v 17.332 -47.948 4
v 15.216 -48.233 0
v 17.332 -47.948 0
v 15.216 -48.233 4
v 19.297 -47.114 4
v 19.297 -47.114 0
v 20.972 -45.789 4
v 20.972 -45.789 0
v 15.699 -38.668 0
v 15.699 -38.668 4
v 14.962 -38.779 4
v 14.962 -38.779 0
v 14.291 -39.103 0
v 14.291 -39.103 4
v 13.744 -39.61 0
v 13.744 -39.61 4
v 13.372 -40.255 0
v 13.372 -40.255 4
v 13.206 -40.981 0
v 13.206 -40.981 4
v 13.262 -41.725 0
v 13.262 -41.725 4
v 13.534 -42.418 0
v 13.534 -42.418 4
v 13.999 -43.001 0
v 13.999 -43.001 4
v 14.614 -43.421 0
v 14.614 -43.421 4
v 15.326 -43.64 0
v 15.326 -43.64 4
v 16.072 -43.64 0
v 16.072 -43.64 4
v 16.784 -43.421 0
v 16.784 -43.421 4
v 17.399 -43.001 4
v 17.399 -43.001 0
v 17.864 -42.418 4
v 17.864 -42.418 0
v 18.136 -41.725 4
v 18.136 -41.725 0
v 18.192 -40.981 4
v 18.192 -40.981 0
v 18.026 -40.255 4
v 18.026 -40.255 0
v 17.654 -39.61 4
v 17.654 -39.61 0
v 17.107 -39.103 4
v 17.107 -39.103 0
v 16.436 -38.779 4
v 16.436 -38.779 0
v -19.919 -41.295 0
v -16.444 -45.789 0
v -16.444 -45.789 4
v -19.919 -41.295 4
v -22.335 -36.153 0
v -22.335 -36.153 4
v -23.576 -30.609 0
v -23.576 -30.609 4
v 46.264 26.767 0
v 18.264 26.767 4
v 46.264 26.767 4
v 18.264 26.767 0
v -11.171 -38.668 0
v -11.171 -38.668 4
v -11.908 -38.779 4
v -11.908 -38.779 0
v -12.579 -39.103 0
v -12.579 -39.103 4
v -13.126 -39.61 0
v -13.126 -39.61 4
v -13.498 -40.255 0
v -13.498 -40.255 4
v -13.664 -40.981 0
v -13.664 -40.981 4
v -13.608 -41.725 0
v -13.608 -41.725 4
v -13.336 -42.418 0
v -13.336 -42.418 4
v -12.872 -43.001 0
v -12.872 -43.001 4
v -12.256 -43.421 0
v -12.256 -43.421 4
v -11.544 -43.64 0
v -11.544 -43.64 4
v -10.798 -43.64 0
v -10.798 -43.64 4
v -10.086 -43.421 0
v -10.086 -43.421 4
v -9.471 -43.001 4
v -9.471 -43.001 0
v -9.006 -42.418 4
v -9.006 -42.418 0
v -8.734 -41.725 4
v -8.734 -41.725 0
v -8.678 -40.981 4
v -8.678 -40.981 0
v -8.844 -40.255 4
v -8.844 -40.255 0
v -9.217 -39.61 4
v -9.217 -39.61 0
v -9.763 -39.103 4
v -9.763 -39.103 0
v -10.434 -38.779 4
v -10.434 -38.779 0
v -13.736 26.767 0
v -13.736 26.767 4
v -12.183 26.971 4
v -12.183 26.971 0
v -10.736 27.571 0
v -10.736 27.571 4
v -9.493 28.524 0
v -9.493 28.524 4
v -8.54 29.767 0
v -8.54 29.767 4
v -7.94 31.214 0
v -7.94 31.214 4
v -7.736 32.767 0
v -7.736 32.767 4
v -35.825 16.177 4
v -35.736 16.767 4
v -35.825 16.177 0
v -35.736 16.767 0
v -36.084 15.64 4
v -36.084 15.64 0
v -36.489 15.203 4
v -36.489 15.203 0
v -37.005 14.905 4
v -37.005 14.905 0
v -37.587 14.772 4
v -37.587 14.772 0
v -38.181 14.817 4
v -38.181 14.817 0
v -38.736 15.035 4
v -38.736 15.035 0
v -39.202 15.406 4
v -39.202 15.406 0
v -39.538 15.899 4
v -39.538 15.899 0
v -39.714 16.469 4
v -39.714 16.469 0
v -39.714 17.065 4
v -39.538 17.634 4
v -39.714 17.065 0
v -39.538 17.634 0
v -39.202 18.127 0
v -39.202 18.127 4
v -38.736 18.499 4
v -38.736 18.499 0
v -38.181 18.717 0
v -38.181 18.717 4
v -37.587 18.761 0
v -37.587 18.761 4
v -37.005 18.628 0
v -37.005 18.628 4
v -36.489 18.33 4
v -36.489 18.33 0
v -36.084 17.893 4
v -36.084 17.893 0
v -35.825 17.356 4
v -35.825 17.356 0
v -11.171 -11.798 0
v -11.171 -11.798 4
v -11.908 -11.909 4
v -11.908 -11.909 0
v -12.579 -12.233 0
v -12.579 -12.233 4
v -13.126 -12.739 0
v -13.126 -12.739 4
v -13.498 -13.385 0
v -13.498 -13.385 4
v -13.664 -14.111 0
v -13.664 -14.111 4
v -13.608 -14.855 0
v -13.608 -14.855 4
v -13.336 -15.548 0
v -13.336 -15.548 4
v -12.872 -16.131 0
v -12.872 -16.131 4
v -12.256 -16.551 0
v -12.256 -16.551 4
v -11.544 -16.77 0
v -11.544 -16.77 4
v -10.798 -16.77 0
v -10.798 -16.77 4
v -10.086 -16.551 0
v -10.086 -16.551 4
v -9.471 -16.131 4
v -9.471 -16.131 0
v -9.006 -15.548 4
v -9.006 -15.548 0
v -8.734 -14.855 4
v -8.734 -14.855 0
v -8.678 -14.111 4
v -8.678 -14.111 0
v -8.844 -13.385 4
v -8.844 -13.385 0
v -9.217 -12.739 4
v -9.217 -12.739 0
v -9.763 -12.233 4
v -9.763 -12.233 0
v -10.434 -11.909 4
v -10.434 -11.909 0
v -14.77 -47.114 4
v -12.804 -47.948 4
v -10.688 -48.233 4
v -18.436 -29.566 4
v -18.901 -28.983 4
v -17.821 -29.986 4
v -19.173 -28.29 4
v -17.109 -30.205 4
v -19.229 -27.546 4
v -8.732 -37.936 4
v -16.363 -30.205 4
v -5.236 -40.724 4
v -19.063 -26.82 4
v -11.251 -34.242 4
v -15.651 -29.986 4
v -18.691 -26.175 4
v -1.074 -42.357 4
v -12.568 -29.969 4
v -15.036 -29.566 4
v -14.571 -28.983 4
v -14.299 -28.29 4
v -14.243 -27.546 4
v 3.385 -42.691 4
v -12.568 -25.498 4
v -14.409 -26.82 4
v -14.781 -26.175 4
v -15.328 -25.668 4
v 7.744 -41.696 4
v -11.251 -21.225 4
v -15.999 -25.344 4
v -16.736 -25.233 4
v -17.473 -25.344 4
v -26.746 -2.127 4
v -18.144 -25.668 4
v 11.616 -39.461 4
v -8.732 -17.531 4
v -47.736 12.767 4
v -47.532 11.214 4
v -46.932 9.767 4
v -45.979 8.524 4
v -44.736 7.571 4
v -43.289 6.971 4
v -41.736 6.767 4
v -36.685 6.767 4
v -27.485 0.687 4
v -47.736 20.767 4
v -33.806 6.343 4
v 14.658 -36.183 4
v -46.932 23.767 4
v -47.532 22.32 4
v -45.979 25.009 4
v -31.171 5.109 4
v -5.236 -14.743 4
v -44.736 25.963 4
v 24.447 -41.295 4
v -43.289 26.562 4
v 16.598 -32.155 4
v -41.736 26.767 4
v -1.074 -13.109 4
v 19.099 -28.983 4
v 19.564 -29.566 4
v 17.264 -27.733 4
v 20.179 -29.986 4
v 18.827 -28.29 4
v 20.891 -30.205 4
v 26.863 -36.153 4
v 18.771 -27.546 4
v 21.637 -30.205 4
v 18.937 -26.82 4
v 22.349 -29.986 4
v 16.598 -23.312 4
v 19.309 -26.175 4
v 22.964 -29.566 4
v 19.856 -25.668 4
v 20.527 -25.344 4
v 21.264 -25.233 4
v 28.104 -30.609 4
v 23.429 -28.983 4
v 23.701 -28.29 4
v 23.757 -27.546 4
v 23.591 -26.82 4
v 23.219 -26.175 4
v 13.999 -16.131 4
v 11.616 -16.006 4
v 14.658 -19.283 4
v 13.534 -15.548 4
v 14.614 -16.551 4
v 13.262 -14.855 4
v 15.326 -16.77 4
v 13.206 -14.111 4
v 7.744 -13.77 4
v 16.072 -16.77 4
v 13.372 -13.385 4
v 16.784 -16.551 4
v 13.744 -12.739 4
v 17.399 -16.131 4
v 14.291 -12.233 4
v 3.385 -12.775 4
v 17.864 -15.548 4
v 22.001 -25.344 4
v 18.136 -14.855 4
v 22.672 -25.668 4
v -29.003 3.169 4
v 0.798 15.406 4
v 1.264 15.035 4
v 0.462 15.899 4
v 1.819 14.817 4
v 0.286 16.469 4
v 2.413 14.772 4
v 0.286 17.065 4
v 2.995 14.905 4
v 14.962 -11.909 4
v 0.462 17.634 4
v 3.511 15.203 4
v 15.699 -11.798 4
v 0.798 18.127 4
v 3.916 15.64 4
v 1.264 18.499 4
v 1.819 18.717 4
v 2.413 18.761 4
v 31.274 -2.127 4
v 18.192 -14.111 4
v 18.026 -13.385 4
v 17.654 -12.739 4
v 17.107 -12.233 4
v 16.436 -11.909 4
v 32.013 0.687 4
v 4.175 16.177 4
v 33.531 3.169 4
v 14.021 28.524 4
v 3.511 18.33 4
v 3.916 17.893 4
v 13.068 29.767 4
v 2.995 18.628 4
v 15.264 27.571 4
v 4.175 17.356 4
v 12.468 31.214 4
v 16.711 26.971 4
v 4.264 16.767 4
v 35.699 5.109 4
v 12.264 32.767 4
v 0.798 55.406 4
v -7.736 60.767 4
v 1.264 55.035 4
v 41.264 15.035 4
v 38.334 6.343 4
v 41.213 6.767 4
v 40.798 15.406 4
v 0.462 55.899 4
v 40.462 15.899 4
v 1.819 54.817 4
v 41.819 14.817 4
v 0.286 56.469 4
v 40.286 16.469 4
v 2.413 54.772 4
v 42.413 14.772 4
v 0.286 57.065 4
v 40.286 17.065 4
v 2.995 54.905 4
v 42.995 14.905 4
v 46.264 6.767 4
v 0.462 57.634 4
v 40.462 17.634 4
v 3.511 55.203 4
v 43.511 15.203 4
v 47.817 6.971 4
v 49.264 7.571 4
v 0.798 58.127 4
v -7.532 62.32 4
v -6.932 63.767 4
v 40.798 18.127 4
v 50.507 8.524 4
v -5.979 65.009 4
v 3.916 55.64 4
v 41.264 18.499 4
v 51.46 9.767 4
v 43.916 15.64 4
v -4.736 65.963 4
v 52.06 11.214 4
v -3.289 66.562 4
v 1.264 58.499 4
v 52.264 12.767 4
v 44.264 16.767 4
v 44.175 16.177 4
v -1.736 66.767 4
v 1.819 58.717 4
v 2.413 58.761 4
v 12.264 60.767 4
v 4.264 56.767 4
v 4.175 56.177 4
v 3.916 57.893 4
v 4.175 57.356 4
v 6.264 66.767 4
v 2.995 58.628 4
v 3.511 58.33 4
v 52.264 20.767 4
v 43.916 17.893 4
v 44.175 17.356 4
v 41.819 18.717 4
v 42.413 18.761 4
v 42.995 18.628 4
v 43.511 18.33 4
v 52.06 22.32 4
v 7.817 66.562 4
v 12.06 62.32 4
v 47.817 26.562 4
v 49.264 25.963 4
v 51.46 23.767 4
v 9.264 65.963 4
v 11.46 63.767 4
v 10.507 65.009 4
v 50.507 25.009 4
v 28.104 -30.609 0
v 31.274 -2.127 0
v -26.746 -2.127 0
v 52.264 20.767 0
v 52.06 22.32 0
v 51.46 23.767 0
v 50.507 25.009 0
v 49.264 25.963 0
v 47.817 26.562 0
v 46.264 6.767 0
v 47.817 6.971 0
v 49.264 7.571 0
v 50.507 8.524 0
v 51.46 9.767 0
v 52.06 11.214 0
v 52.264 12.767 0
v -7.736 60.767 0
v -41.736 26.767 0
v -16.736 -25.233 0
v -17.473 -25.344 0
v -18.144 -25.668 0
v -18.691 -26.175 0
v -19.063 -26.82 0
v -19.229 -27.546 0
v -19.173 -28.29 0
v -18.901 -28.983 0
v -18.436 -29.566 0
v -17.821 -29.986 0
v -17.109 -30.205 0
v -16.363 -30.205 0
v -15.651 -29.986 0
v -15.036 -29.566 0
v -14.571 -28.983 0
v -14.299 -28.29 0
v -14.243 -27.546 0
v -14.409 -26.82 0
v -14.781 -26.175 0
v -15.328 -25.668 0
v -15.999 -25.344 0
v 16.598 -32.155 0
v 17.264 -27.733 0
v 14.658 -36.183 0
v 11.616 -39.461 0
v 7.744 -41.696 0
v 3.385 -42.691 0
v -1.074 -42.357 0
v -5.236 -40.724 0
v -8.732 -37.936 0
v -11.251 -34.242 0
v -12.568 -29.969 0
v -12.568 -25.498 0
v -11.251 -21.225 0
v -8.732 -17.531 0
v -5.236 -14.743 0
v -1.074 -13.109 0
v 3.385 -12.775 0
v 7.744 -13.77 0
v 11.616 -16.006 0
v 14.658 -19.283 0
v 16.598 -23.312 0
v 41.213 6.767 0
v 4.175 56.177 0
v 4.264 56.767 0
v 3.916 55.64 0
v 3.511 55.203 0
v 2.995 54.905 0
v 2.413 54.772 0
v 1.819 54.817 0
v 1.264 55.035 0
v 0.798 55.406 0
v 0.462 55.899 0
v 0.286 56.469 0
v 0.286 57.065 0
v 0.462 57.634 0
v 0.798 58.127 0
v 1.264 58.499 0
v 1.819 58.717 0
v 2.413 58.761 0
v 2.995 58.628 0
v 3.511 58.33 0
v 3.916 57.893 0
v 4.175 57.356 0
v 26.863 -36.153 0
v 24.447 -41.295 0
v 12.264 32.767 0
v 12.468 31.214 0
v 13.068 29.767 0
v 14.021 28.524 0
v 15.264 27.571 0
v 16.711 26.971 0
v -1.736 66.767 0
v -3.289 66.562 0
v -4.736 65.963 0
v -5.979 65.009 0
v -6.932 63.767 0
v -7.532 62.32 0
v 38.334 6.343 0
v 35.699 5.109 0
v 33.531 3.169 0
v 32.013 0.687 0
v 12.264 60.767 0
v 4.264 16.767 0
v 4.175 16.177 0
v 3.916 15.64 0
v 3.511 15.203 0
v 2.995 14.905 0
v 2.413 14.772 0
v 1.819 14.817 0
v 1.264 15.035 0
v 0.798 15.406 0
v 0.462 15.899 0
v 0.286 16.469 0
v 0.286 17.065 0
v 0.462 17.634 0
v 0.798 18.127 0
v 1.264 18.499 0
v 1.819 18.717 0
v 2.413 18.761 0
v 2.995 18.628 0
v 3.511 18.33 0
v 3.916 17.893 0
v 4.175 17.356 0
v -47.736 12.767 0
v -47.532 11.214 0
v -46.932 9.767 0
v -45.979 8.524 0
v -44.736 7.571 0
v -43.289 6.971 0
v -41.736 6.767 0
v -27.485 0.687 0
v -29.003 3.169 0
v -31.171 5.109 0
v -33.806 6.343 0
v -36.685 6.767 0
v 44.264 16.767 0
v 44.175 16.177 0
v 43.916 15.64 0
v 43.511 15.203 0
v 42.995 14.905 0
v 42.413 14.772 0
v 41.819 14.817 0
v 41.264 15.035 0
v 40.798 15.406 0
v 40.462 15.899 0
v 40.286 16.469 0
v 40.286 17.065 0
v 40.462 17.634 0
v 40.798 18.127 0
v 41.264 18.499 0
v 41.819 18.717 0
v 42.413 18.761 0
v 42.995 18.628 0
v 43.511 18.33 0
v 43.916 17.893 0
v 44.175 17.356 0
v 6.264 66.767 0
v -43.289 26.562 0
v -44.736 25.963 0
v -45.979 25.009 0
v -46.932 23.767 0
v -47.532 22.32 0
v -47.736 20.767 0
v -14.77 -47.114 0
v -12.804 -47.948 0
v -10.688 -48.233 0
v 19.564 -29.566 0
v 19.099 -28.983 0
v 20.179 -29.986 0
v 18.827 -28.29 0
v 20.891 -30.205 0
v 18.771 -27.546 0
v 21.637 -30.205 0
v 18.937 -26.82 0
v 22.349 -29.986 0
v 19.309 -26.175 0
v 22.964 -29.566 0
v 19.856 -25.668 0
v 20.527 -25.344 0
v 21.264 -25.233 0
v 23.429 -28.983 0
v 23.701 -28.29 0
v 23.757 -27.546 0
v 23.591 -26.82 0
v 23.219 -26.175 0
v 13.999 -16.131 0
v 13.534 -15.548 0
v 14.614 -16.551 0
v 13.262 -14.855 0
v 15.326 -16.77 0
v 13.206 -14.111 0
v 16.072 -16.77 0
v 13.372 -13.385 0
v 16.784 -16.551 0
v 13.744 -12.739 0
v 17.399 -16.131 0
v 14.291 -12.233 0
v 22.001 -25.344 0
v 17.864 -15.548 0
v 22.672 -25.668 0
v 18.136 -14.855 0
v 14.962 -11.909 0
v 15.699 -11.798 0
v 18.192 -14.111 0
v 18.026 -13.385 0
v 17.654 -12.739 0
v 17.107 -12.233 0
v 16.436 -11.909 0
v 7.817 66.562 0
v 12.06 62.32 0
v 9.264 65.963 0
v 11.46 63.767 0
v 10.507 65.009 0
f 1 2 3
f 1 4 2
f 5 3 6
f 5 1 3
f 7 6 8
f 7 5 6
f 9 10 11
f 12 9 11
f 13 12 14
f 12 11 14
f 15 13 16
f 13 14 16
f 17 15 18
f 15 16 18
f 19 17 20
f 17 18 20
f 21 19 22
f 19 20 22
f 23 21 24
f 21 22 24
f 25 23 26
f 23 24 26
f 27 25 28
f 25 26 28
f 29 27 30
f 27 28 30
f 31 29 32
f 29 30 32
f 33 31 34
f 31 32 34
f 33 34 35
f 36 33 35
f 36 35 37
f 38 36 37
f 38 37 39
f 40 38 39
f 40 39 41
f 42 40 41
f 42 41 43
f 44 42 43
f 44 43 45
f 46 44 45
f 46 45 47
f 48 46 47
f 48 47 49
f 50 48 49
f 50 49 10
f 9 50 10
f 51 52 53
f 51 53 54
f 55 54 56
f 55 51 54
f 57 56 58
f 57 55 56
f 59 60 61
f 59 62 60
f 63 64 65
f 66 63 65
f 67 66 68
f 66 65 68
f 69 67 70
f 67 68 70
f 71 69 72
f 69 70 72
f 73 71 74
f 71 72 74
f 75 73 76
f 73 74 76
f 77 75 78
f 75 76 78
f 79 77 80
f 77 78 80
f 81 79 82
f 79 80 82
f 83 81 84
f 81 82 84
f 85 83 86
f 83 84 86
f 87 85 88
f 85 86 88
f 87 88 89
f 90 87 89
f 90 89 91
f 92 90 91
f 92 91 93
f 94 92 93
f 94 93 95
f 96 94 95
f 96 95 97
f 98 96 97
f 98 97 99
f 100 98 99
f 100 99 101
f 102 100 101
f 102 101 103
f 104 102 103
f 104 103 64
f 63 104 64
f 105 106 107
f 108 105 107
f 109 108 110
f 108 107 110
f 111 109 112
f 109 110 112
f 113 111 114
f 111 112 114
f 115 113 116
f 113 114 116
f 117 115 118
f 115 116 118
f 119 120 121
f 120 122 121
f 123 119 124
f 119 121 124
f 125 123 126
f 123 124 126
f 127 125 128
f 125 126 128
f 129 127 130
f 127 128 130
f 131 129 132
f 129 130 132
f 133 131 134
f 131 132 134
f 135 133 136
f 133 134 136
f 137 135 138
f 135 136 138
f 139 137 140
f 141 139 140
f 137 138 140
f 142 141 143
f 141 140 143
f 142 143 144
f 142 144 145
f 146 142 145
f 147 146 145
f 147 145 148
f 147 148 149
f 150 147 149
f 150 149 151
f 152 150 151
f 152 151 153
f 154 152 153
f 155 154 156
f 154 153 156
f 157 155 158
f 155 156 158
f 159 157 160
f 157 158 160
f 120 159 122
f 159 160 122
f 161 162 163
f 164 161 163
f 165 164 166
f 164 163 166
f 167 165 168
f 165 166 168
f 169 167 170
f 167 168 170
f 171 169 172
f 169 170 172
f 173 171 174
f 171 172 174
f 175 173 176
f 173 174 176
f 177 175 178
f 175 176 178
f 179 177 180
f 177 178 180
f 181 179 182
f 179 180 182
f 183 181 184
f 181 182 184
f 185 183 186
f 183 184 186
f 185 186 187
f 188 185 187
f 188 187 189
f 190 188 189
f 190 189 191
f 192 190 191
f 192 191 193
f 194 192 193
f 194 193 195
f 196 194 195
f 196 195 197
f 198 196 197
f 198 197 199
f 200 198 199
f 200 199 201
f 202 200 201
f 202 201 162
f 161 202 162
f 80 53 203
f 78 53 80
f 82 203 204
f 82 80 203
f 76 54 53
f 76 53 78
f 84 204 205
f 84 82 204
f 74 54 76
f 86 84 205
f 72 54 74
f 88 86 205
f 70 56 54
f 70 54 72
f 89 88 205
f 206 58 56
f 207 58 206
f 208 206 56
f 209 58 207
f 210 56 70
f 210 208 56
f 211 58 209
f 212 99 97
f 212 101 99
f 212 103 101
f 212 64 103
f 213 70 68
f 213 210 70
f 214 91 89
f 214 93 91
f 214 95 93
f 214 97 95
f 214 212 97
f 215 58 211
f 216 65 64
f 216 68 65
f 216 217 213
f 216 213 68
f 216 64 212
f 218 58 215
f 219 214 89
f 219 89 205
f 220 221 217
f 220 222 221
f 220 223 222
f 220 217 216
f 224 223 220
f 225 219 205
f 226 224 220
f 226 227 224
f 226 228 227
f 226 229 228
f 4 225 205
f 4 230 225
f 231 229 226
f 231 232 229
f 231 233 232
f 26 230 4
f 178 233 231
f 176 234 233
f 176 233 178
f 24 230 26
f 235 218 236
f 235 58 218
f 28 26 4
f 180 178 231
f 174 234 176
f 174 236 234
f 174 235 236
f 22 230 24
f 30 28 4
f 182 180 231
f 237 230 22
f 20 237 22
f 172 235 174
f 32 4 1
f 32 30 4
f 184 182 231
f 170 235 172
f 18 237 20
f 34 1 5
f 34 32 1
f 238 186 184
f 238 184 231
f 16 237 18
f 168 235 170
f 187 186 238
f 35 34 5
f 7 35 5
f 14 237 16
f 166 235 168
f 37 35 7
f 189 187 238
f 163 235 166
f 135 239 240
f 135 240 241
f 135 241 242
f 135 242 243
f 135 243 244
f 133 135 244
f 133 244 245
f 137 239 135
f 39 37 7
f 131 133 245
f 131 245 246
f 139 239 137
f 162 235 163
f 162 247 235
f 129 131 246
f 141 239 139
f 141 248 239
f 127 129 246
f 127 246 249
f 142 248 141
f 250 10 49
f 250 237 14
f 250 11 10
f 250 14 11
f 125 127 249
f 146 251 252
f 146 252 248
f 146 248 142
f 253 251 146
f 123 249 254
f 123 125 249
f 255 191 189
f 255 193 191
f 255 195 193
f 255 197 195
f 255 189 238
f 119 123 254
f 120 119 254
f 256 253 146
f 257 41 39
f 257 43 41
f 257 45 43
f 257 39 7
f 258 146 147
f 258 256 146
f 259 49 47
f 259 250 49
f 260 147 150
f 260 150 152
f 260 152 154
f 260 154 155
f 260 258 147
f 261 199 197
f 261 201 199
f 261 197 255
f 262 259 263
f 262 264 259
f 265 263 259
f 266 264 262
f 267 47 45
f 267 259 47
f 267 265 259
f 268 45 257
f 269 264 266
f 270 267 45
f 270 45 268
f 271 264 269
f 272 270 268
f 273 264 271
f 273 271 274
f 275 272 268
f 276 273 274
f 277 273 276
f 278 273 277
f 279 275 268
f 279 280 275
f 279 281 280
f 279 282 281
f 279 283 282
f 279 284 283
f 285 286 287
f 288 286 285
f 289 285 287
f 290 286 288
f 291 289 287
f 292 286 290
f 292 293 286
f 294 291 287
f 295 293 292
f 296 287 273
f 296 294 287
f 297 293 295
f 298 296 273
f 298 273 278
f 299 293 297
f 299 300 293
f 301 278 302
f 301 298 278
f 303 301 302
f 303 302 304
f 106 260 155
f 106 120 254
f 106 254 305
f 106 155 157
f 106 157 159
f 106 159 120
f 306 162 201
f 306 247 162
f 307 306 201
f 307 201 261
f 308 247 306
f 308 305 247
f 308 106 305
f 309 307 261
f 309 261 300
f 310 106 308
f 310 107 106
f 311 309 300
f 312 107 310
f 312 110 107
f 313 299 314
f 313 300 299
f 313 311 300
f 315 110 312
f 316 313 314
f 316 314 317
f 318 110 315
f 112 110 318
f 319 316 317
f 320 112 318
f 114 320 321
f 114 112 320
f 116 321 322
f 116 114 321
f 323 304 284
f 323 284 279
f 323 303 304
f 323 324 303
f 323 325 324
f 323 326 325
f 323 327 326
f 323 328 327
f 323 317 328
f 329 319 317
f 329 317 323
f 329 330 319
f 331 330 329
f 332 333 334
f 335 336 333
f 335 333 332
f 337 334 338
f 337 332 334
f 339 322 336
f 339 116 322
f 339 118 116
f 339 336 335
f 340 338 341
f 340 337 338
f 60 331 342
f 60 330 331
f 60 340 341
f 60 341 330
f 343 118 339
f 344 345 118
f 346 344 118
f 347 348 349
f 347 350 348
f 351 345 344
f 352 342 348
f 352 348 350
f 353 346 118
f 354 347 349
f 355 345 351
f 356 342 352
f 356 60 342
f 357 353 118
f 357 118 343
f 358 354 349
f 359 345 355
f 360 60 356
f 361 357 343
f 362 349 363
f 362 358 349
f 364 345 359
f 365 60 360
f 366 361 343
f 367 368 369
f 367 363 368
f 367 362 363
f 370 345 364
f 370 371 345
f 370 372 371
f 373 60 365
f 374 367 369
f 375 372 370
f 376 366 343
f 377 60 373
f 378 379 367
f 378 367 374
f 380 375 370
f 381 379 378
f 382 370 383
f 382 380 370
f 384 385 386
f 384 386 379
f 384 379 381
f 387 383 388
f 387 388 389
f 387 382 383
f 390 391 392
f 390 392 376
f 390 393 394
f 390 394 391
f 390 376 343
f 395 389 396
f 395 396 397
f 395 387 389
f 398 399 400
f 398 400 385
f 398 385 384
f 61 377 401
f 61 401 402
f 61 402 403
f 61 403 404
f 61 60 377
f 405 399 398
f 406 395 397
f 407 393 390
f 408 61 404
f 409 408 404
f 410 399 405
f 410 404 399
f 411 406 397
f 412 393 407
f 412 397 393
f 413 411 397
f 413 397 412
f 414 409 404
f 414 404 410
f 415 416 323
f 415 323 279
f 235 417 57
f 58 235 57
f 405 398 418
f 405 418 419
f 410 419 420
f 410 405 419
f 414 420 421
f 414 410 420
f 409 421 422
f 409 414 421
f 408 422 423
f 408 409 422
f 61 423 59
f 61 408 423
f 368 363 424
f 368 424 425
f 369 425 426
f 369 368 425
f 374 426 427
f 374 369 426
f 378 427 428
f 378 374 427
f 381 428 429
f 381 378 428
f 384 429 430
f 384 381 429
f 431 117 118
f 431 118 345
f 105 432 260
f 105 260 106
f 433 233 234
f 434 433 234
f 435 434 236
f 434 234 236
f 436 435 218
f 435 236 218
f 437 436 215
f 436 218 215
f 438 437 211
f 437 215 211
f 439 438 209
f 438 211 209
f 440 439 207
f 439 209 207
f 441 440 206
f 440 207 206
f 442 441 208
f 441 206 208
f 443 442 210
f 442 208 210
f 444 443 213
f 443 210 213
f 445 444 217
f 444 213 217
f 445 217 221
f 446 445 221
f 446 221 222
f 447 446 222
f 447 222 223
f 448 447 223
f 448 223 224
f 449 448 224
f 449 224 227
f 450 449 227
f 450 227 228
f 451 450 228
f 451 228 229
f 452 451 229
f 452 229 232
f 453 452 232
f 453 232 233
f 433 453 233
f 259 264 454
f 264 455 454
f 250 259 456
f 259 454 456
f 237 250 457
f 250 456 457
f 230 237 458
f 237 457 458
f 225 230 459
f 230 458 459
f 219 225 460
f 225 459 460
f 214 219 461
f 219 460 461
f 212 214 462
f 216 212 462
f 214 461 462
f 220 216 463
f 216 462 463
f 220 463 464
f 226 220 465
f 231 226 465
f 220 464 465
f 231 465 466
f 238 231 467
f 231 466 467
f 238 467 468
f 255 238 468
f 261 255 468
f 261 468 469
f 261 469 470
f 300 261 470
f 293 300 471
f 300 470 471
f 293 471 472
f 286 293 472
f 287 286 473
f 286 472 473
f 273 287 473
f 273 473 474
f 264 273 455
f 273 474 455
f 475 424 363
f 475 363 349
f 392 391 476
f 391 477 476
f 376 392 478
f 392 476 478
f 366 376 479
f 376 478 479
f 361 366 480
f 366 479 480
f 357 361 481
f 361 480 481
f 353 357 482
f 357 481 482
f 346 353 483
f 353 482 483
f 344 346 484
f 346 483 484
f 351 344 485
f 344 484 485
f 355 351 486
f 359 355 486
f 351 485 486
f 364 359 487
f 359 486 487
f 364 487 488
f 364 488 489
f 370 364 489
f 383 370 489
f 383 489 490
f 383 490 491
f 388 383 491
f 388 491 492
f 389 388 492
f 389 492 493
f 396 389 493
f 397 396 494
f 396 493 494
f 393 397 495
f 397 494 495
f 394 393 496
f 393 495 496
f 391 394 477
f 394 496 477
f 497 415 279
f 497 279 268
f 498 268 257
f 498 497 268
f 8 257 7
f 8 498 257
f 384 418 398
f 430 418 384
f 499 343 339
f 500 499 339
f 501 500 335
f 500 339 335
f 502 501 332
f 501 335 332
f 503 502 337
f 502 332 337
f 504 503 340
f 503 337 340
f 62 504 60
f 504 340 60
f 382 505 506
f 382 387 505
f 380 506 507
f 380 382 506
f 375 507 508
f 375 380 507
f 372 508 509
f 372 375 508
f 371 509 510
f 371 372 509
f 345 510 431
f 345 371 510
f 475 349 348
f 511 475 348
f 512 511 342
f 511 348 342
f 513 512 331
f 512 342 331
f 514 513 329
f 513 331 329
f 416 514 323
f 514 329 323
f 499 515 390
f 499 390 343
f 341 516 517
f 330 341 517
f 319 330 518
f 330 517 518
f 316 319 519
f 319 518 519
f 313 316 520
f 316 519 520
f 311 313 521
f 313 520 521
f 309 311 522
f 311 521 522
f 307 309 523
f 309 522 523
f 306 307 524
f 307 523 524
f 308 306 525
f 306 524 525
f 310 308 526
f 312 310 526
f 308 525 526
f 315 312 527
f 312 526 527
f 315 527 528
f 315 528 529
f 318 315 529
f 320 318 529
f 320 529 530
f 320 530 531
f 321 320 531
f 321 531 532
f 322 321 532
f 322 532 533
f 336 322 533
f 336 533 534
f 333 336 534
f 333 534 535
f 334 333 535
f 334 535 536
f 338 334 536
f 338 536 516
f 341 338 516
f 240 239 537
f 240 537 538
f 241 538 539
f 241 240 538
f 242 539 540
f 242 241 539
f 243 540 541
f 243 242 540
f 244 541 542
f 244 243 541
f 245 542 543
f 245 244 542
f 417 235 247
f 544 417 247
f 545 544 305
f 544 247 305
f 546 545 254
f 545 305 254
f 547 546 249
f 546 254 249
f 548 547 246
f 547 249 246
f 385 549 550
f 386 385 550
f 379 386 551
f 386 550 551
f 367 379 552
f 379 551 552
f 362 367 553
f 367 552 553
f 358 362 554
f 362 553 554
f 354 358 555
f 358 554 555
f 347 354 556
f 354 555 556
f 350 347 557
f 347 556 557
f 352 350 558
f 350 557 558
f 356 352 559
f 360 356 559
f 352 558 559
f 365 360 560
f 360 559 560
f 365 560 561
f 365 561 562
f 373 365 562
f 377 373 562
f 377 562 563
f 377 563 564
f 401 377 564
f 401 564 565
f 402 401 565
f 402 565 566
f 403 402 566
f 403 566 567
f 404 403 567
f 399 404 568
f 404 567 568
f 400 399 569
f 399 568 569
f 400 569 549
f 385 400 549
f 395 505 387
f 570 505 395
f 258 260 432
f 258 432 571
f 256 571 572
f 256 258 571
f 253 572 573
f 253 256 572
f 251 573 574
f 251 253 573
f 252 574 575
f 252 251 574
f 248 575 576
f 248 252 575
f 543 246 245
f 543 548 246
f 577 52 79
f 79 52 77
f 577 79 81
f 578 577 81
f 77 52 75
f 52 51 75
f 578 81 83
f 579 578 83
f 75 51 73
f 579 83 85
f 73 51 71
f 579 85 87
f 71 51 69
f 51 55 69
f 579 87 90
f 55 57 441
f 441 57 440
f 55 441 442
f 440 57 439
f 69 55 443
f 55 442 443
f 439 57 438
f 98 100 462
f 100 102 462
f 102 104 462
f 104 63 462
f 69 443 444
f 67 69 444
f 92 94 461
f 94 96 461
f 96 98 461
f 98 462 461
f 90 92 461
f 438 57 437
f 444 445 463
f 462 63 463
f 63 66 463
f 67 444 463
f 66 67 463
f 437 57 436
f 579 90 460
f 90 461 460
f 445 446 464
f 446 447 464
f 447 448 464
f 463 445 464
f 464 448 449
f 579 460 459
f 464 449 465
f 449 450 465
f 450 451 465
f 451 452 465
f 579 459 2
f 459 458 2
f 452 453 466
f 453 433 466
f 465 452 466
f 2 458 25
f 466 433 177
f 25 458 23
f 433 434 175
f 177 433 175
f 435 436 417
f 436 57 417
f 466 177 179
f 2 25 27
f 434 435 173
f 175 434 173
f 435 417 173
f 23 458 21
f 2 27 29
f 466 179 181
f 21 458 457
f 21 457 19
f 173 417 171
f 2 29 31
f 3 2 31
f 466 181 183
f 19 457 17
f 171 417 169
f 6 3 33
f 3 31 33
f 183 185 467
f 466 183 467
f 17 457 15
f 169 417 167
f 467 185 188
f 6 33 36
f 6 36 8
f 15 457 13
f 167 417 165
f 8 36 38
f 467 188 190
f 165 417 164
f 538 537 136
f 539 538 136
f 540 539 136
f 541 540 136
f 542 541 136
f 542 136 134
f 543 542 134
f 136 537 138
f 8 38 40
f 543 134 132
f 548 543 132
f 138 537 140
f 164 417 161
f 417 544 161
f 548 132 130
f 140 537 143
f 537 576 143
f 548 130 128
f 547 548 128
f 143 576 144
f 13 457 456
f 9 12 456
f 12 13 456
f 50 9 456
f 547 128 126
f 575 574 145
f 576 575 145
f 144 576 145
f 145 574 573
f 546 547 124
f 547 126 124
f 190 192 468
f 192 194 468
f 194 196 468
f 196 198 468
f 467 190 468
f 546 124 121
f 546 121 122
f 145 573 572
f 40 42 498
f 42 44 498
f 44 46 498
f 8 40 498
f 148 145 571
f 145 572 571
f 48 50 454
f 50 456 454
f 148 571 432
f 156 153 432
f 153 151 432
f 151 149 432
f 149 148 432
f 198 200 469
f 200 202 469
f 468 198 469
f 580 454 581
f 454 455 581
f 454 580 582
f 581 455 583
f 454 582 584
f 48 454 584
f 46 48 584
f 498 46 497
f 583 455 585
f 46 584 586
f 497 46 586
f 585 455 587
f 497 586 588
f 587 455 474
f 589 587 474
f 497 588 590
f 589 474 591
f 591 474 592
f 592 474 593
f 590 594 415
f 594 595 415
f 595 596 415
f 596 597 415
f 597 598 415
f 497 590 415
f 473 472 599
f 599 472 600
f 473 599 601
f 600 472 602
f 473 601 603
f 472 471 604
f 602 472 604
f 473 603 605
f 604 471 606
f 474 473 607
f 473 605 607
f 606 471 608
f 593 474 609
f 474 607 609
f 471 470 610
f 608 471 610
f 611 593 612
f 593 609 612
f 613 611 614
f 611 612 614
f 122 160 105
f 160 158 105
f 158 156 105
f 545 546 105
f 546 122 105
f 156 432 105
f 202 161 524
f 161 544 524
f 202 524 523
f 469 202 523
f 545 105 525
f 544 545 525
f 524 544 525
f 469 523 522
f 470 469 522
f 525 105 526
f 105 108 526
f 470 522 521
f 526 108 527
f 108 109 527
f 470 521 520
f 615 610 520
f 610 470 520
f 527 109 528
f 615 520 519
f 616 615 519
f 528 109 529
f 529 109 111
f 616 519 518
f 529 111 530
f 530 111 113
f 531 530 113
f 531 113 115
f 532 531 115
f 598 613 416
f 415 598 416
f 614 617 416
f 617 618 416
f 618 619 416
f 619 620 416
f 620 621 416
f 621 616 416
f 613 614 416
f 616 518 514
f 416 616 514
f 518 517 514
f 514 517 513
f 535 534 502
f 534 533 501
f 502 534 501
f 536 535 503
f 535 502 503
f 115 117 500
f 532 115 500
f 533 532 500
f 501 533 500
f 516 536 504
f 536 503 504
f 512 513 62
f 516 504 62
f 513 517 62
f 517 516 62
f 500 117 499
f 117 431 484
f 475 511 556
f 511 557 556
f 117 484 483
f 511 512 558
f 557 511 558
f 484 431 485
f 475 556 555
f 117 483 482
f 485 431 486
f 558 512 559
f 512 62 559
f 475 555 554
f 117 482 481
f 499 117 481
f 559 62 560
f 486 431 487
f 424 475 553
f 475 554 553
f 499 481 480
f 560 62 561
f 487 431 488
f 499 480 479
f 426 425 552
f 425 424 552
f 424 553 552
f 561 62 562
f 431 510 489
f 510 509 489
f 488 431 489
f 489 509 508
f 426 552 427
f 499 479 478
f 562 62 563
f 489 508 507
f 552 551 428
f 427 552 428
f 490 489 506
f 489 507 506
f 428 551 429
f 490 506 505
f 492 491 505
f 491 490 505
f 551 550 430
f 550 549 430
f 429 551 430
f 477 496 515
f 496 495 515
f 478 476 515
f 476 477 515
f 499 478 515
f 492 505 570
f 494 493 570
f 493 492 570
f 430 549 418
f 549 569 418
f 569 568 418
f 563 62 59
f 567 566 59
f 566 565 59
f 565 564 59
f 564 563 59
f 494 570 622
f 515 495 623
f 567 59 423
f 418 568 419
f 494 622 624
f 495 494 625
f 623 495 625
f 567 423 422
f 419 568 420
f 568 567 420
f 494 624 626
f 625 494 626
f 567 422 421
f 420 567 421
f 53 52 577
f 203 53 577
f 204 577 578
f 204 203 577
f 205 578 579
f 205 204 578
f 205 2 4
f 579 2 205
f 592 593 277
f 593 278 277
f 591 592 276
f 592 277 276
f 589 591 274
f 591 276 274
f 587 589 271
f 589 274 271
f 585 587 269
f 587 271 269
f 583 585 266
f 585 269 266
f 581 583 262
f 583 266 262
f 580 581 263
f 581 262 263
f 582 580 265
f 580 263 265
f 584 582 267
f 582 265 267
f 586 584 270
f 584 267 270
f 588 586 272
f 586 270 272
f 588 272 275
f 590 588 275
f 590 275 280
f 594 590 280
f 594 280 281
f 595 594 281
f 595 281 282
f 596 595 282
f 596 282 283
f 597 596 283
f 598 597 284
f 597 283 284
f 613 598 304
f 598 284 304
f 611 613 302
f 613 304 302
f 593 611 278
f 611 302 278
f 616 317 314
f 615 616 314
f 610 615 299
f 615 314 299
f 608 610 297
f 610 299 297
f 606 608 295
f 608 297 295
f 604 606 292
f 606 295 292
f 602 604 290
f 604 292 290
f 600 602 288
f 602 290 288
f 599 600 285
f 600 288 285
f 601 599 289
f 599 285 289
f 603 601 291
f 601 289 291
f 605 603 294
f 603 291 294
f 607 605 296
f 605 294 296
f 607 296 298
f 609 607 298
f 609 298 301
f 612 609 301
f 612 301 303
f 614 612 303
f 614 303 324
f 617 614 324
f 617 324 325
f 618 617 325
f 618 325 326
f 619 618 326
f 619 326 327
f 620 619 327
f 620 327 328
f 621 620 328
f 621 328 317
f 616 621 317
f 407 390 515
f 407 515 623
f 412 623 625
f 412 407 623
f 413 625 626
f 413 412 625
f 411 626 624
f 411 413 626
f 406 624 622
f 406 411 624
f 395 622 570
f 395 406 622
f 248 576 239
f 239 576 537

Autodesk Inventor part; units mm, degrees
ref_plane "YZ Plane" through (0, 0, 0) normal (1, 0, 0) x (0, 1, 0)
ref_plane "XZ Plane" through (0, 0, 0) normal (0, 1, 0) x (-1, 0, 0)
ref_plane "XY Plane" through (0, 0, 0) normal (0, 0, 1) x (1, 0, 0)
sketch "Szkic1" plane through (0, 0, 0) normal (0, 0, 1) x (1, 0, 0)
  line L0 (-47.736, 26.7667) -> (-47.736, 6.7667)
  line L1 (-47.736, 26.7667) -> (52.264, 26.7667)
  line L2 (52.264, 26.7667) -> (52.264, 6.7667)
  line L3 (52.264, 6.7667) -> (32.264, 6.7667)
  line L4 (32.264, 6.7667) -> (32.264, -48.2333)
  line L5 (32.264, -48.2333) -> (-27.736, -48.2333)
  line L6 (-27.736, -48.2333) -> (-27.736, 6.7667)
  line L7 (-27.736, 6.7667) -> (-47.736, 6.7667)
  circle A0 centre (2.264, -27.7333) radius 19
  arc A1 (-11.0025, -7.7333) -> (-11.0025, -47.7333) centre (2.264, -27.7333) ccw
  line L8 (-11.0025, -47.7333) -> (15.5305, -47.7333)
  arc A2 (15.5305, -47.7333) -> (15.5305, -7.7333) centre (2.264, -27.7333) ccw
  line L9 (15.5305, -7.7333) -> (-11.0025, -7.7333)
  circle A3 centre (2.264, -27.7333) radius 15
  circle A4 centre (-37.736, 16.7667) radius 2
  circle A5 centre (2.264, 16.7667) radius 2
  circle A6 centre (42.264, 16.7667) radius 2
  arc A7 (-23.5765, -30.609) -> (-13.7282, -48.2333) centre (2.264, -27.7333) ccw
  arc A8 (18.2561, -48.2333) -> (28.1044, -30.609) centre (2.264, -27.7333) ccw
  line L10 (-27.736, 6.7667) -> (-23.5765, -30.609)
  line L11 (32.264, 6.7667) -> (28.1044, -30.609)
  line L12 (-7.736, 26.7667) -> (-7.736, 66.7667)
  line L13 (-7.736, 66.7667) -> (12.264, 66.7667)
  line L14 (12.264, 66.7667) -> (12.264, 26.7667)
  circle A9 centre (2.264, 56.7667) radius 2
  point P0 (0, 0)
  point P1 (-16.736, -27.7333)
  point P2 (-11.1711, -41.1683)
  point P3 (15.699, -14.2982)
  point P4 (15.699, -41.1683)
  point P5 (-11.1711, -14.2982)
  point P6 (21.264, -27.7333)
  dimension "d0" = 20
  dimension "d1" = 100
  dimension "d2" = 20
  dimension "d3" = 60
  dimension "d4" = 20
  dimension "d5" = 55
  dimension "d8" = 38
  dimension "d13" = 34.5
  dimension "d14" = 30
  dimension "d15" = 30
  dimension "d24" = 4
  dimension "d25" = 4
  dimension "d26" = 4
  dimension "d29" = 10
  dimension "d30" = 10
  dimension "d31" = 10
  dimension "d32" = 10
  dimension "d33" = 10
  dimension "d34" = 50
  dimension "d42" = 2
  dimension "d47" = 40
  dimension "d48" = 20
  dimension "d49" = 40
  dimension "d50" = 10
  dimension "d51" = 10
  dimension "d52" = 4
extrude "Wyciągnięcie proste1" add sketch "Szkic1" along normal blind 4 contours L1 L2 L3 L11 A8 L5 A7 L10 L7 L0 | L12 L13 L14 L1 | L10 A7 L5 L6 | A8 L11 L4 L5 | A0 | L9 A2 L8 A1 | A3 | A4 | A5 | A6 | A9
extrude "Wyciągnięcie proste2" cut sketch "Szkic1" along normal through all contours A3 | A4 | A5 | A6 | A9
hole "Otwór1" at (2.264, -27.7333, 0) at (21.264, -27.7333, 0) at (-11.1711, -41.1683, 0) at (15.699, -41.1683, 0) at (15.699, -14.2982, 0) at (-11.1711, -14.2982, 0) at (-16.736, -27.7333, 0) direction (0, 0, 1) diameter 5 end through all
extrude "Wyciągnięcie proste3" cut sketch "Szkic1" along normal blind 10 contours L10 A7 L5 L6 | A8 L11 L4 L5
fillet "Zaokrąglenie1" radius 6 8 edges at (-47.736, 6.7667, 2) (-47.736, 26.7667, 2) (52.264, 6.7667, 2) (52.264, 26.7667, 2) (-7.736, 26.7667, 2) (-7.736, 66.7667, 2) (12.264, 26.7667, 2) (12.264, 66.7667, 2)
fillet "Zaokrąglenie2" radius 10 2 edges at (-27.736, 6.7667, 2) (32.264, 6.7667, 2)
fillet "Zaokrąglenie3" radius 8 2 edges at (-13.7282, -48.2333, 2) (18.2561, -48.2333, 2)
equation "\"d2\" = -0.5 * d3 + 0.5 * d1"
equation "\"d14\" = 0.5 * d3"
equation "\"d34\" = 0.5 * d1"
properties part number "LC_ALU_4mm_Heatbed_Frame_Ball_Screw_Nut_Mounting_Bracket"
